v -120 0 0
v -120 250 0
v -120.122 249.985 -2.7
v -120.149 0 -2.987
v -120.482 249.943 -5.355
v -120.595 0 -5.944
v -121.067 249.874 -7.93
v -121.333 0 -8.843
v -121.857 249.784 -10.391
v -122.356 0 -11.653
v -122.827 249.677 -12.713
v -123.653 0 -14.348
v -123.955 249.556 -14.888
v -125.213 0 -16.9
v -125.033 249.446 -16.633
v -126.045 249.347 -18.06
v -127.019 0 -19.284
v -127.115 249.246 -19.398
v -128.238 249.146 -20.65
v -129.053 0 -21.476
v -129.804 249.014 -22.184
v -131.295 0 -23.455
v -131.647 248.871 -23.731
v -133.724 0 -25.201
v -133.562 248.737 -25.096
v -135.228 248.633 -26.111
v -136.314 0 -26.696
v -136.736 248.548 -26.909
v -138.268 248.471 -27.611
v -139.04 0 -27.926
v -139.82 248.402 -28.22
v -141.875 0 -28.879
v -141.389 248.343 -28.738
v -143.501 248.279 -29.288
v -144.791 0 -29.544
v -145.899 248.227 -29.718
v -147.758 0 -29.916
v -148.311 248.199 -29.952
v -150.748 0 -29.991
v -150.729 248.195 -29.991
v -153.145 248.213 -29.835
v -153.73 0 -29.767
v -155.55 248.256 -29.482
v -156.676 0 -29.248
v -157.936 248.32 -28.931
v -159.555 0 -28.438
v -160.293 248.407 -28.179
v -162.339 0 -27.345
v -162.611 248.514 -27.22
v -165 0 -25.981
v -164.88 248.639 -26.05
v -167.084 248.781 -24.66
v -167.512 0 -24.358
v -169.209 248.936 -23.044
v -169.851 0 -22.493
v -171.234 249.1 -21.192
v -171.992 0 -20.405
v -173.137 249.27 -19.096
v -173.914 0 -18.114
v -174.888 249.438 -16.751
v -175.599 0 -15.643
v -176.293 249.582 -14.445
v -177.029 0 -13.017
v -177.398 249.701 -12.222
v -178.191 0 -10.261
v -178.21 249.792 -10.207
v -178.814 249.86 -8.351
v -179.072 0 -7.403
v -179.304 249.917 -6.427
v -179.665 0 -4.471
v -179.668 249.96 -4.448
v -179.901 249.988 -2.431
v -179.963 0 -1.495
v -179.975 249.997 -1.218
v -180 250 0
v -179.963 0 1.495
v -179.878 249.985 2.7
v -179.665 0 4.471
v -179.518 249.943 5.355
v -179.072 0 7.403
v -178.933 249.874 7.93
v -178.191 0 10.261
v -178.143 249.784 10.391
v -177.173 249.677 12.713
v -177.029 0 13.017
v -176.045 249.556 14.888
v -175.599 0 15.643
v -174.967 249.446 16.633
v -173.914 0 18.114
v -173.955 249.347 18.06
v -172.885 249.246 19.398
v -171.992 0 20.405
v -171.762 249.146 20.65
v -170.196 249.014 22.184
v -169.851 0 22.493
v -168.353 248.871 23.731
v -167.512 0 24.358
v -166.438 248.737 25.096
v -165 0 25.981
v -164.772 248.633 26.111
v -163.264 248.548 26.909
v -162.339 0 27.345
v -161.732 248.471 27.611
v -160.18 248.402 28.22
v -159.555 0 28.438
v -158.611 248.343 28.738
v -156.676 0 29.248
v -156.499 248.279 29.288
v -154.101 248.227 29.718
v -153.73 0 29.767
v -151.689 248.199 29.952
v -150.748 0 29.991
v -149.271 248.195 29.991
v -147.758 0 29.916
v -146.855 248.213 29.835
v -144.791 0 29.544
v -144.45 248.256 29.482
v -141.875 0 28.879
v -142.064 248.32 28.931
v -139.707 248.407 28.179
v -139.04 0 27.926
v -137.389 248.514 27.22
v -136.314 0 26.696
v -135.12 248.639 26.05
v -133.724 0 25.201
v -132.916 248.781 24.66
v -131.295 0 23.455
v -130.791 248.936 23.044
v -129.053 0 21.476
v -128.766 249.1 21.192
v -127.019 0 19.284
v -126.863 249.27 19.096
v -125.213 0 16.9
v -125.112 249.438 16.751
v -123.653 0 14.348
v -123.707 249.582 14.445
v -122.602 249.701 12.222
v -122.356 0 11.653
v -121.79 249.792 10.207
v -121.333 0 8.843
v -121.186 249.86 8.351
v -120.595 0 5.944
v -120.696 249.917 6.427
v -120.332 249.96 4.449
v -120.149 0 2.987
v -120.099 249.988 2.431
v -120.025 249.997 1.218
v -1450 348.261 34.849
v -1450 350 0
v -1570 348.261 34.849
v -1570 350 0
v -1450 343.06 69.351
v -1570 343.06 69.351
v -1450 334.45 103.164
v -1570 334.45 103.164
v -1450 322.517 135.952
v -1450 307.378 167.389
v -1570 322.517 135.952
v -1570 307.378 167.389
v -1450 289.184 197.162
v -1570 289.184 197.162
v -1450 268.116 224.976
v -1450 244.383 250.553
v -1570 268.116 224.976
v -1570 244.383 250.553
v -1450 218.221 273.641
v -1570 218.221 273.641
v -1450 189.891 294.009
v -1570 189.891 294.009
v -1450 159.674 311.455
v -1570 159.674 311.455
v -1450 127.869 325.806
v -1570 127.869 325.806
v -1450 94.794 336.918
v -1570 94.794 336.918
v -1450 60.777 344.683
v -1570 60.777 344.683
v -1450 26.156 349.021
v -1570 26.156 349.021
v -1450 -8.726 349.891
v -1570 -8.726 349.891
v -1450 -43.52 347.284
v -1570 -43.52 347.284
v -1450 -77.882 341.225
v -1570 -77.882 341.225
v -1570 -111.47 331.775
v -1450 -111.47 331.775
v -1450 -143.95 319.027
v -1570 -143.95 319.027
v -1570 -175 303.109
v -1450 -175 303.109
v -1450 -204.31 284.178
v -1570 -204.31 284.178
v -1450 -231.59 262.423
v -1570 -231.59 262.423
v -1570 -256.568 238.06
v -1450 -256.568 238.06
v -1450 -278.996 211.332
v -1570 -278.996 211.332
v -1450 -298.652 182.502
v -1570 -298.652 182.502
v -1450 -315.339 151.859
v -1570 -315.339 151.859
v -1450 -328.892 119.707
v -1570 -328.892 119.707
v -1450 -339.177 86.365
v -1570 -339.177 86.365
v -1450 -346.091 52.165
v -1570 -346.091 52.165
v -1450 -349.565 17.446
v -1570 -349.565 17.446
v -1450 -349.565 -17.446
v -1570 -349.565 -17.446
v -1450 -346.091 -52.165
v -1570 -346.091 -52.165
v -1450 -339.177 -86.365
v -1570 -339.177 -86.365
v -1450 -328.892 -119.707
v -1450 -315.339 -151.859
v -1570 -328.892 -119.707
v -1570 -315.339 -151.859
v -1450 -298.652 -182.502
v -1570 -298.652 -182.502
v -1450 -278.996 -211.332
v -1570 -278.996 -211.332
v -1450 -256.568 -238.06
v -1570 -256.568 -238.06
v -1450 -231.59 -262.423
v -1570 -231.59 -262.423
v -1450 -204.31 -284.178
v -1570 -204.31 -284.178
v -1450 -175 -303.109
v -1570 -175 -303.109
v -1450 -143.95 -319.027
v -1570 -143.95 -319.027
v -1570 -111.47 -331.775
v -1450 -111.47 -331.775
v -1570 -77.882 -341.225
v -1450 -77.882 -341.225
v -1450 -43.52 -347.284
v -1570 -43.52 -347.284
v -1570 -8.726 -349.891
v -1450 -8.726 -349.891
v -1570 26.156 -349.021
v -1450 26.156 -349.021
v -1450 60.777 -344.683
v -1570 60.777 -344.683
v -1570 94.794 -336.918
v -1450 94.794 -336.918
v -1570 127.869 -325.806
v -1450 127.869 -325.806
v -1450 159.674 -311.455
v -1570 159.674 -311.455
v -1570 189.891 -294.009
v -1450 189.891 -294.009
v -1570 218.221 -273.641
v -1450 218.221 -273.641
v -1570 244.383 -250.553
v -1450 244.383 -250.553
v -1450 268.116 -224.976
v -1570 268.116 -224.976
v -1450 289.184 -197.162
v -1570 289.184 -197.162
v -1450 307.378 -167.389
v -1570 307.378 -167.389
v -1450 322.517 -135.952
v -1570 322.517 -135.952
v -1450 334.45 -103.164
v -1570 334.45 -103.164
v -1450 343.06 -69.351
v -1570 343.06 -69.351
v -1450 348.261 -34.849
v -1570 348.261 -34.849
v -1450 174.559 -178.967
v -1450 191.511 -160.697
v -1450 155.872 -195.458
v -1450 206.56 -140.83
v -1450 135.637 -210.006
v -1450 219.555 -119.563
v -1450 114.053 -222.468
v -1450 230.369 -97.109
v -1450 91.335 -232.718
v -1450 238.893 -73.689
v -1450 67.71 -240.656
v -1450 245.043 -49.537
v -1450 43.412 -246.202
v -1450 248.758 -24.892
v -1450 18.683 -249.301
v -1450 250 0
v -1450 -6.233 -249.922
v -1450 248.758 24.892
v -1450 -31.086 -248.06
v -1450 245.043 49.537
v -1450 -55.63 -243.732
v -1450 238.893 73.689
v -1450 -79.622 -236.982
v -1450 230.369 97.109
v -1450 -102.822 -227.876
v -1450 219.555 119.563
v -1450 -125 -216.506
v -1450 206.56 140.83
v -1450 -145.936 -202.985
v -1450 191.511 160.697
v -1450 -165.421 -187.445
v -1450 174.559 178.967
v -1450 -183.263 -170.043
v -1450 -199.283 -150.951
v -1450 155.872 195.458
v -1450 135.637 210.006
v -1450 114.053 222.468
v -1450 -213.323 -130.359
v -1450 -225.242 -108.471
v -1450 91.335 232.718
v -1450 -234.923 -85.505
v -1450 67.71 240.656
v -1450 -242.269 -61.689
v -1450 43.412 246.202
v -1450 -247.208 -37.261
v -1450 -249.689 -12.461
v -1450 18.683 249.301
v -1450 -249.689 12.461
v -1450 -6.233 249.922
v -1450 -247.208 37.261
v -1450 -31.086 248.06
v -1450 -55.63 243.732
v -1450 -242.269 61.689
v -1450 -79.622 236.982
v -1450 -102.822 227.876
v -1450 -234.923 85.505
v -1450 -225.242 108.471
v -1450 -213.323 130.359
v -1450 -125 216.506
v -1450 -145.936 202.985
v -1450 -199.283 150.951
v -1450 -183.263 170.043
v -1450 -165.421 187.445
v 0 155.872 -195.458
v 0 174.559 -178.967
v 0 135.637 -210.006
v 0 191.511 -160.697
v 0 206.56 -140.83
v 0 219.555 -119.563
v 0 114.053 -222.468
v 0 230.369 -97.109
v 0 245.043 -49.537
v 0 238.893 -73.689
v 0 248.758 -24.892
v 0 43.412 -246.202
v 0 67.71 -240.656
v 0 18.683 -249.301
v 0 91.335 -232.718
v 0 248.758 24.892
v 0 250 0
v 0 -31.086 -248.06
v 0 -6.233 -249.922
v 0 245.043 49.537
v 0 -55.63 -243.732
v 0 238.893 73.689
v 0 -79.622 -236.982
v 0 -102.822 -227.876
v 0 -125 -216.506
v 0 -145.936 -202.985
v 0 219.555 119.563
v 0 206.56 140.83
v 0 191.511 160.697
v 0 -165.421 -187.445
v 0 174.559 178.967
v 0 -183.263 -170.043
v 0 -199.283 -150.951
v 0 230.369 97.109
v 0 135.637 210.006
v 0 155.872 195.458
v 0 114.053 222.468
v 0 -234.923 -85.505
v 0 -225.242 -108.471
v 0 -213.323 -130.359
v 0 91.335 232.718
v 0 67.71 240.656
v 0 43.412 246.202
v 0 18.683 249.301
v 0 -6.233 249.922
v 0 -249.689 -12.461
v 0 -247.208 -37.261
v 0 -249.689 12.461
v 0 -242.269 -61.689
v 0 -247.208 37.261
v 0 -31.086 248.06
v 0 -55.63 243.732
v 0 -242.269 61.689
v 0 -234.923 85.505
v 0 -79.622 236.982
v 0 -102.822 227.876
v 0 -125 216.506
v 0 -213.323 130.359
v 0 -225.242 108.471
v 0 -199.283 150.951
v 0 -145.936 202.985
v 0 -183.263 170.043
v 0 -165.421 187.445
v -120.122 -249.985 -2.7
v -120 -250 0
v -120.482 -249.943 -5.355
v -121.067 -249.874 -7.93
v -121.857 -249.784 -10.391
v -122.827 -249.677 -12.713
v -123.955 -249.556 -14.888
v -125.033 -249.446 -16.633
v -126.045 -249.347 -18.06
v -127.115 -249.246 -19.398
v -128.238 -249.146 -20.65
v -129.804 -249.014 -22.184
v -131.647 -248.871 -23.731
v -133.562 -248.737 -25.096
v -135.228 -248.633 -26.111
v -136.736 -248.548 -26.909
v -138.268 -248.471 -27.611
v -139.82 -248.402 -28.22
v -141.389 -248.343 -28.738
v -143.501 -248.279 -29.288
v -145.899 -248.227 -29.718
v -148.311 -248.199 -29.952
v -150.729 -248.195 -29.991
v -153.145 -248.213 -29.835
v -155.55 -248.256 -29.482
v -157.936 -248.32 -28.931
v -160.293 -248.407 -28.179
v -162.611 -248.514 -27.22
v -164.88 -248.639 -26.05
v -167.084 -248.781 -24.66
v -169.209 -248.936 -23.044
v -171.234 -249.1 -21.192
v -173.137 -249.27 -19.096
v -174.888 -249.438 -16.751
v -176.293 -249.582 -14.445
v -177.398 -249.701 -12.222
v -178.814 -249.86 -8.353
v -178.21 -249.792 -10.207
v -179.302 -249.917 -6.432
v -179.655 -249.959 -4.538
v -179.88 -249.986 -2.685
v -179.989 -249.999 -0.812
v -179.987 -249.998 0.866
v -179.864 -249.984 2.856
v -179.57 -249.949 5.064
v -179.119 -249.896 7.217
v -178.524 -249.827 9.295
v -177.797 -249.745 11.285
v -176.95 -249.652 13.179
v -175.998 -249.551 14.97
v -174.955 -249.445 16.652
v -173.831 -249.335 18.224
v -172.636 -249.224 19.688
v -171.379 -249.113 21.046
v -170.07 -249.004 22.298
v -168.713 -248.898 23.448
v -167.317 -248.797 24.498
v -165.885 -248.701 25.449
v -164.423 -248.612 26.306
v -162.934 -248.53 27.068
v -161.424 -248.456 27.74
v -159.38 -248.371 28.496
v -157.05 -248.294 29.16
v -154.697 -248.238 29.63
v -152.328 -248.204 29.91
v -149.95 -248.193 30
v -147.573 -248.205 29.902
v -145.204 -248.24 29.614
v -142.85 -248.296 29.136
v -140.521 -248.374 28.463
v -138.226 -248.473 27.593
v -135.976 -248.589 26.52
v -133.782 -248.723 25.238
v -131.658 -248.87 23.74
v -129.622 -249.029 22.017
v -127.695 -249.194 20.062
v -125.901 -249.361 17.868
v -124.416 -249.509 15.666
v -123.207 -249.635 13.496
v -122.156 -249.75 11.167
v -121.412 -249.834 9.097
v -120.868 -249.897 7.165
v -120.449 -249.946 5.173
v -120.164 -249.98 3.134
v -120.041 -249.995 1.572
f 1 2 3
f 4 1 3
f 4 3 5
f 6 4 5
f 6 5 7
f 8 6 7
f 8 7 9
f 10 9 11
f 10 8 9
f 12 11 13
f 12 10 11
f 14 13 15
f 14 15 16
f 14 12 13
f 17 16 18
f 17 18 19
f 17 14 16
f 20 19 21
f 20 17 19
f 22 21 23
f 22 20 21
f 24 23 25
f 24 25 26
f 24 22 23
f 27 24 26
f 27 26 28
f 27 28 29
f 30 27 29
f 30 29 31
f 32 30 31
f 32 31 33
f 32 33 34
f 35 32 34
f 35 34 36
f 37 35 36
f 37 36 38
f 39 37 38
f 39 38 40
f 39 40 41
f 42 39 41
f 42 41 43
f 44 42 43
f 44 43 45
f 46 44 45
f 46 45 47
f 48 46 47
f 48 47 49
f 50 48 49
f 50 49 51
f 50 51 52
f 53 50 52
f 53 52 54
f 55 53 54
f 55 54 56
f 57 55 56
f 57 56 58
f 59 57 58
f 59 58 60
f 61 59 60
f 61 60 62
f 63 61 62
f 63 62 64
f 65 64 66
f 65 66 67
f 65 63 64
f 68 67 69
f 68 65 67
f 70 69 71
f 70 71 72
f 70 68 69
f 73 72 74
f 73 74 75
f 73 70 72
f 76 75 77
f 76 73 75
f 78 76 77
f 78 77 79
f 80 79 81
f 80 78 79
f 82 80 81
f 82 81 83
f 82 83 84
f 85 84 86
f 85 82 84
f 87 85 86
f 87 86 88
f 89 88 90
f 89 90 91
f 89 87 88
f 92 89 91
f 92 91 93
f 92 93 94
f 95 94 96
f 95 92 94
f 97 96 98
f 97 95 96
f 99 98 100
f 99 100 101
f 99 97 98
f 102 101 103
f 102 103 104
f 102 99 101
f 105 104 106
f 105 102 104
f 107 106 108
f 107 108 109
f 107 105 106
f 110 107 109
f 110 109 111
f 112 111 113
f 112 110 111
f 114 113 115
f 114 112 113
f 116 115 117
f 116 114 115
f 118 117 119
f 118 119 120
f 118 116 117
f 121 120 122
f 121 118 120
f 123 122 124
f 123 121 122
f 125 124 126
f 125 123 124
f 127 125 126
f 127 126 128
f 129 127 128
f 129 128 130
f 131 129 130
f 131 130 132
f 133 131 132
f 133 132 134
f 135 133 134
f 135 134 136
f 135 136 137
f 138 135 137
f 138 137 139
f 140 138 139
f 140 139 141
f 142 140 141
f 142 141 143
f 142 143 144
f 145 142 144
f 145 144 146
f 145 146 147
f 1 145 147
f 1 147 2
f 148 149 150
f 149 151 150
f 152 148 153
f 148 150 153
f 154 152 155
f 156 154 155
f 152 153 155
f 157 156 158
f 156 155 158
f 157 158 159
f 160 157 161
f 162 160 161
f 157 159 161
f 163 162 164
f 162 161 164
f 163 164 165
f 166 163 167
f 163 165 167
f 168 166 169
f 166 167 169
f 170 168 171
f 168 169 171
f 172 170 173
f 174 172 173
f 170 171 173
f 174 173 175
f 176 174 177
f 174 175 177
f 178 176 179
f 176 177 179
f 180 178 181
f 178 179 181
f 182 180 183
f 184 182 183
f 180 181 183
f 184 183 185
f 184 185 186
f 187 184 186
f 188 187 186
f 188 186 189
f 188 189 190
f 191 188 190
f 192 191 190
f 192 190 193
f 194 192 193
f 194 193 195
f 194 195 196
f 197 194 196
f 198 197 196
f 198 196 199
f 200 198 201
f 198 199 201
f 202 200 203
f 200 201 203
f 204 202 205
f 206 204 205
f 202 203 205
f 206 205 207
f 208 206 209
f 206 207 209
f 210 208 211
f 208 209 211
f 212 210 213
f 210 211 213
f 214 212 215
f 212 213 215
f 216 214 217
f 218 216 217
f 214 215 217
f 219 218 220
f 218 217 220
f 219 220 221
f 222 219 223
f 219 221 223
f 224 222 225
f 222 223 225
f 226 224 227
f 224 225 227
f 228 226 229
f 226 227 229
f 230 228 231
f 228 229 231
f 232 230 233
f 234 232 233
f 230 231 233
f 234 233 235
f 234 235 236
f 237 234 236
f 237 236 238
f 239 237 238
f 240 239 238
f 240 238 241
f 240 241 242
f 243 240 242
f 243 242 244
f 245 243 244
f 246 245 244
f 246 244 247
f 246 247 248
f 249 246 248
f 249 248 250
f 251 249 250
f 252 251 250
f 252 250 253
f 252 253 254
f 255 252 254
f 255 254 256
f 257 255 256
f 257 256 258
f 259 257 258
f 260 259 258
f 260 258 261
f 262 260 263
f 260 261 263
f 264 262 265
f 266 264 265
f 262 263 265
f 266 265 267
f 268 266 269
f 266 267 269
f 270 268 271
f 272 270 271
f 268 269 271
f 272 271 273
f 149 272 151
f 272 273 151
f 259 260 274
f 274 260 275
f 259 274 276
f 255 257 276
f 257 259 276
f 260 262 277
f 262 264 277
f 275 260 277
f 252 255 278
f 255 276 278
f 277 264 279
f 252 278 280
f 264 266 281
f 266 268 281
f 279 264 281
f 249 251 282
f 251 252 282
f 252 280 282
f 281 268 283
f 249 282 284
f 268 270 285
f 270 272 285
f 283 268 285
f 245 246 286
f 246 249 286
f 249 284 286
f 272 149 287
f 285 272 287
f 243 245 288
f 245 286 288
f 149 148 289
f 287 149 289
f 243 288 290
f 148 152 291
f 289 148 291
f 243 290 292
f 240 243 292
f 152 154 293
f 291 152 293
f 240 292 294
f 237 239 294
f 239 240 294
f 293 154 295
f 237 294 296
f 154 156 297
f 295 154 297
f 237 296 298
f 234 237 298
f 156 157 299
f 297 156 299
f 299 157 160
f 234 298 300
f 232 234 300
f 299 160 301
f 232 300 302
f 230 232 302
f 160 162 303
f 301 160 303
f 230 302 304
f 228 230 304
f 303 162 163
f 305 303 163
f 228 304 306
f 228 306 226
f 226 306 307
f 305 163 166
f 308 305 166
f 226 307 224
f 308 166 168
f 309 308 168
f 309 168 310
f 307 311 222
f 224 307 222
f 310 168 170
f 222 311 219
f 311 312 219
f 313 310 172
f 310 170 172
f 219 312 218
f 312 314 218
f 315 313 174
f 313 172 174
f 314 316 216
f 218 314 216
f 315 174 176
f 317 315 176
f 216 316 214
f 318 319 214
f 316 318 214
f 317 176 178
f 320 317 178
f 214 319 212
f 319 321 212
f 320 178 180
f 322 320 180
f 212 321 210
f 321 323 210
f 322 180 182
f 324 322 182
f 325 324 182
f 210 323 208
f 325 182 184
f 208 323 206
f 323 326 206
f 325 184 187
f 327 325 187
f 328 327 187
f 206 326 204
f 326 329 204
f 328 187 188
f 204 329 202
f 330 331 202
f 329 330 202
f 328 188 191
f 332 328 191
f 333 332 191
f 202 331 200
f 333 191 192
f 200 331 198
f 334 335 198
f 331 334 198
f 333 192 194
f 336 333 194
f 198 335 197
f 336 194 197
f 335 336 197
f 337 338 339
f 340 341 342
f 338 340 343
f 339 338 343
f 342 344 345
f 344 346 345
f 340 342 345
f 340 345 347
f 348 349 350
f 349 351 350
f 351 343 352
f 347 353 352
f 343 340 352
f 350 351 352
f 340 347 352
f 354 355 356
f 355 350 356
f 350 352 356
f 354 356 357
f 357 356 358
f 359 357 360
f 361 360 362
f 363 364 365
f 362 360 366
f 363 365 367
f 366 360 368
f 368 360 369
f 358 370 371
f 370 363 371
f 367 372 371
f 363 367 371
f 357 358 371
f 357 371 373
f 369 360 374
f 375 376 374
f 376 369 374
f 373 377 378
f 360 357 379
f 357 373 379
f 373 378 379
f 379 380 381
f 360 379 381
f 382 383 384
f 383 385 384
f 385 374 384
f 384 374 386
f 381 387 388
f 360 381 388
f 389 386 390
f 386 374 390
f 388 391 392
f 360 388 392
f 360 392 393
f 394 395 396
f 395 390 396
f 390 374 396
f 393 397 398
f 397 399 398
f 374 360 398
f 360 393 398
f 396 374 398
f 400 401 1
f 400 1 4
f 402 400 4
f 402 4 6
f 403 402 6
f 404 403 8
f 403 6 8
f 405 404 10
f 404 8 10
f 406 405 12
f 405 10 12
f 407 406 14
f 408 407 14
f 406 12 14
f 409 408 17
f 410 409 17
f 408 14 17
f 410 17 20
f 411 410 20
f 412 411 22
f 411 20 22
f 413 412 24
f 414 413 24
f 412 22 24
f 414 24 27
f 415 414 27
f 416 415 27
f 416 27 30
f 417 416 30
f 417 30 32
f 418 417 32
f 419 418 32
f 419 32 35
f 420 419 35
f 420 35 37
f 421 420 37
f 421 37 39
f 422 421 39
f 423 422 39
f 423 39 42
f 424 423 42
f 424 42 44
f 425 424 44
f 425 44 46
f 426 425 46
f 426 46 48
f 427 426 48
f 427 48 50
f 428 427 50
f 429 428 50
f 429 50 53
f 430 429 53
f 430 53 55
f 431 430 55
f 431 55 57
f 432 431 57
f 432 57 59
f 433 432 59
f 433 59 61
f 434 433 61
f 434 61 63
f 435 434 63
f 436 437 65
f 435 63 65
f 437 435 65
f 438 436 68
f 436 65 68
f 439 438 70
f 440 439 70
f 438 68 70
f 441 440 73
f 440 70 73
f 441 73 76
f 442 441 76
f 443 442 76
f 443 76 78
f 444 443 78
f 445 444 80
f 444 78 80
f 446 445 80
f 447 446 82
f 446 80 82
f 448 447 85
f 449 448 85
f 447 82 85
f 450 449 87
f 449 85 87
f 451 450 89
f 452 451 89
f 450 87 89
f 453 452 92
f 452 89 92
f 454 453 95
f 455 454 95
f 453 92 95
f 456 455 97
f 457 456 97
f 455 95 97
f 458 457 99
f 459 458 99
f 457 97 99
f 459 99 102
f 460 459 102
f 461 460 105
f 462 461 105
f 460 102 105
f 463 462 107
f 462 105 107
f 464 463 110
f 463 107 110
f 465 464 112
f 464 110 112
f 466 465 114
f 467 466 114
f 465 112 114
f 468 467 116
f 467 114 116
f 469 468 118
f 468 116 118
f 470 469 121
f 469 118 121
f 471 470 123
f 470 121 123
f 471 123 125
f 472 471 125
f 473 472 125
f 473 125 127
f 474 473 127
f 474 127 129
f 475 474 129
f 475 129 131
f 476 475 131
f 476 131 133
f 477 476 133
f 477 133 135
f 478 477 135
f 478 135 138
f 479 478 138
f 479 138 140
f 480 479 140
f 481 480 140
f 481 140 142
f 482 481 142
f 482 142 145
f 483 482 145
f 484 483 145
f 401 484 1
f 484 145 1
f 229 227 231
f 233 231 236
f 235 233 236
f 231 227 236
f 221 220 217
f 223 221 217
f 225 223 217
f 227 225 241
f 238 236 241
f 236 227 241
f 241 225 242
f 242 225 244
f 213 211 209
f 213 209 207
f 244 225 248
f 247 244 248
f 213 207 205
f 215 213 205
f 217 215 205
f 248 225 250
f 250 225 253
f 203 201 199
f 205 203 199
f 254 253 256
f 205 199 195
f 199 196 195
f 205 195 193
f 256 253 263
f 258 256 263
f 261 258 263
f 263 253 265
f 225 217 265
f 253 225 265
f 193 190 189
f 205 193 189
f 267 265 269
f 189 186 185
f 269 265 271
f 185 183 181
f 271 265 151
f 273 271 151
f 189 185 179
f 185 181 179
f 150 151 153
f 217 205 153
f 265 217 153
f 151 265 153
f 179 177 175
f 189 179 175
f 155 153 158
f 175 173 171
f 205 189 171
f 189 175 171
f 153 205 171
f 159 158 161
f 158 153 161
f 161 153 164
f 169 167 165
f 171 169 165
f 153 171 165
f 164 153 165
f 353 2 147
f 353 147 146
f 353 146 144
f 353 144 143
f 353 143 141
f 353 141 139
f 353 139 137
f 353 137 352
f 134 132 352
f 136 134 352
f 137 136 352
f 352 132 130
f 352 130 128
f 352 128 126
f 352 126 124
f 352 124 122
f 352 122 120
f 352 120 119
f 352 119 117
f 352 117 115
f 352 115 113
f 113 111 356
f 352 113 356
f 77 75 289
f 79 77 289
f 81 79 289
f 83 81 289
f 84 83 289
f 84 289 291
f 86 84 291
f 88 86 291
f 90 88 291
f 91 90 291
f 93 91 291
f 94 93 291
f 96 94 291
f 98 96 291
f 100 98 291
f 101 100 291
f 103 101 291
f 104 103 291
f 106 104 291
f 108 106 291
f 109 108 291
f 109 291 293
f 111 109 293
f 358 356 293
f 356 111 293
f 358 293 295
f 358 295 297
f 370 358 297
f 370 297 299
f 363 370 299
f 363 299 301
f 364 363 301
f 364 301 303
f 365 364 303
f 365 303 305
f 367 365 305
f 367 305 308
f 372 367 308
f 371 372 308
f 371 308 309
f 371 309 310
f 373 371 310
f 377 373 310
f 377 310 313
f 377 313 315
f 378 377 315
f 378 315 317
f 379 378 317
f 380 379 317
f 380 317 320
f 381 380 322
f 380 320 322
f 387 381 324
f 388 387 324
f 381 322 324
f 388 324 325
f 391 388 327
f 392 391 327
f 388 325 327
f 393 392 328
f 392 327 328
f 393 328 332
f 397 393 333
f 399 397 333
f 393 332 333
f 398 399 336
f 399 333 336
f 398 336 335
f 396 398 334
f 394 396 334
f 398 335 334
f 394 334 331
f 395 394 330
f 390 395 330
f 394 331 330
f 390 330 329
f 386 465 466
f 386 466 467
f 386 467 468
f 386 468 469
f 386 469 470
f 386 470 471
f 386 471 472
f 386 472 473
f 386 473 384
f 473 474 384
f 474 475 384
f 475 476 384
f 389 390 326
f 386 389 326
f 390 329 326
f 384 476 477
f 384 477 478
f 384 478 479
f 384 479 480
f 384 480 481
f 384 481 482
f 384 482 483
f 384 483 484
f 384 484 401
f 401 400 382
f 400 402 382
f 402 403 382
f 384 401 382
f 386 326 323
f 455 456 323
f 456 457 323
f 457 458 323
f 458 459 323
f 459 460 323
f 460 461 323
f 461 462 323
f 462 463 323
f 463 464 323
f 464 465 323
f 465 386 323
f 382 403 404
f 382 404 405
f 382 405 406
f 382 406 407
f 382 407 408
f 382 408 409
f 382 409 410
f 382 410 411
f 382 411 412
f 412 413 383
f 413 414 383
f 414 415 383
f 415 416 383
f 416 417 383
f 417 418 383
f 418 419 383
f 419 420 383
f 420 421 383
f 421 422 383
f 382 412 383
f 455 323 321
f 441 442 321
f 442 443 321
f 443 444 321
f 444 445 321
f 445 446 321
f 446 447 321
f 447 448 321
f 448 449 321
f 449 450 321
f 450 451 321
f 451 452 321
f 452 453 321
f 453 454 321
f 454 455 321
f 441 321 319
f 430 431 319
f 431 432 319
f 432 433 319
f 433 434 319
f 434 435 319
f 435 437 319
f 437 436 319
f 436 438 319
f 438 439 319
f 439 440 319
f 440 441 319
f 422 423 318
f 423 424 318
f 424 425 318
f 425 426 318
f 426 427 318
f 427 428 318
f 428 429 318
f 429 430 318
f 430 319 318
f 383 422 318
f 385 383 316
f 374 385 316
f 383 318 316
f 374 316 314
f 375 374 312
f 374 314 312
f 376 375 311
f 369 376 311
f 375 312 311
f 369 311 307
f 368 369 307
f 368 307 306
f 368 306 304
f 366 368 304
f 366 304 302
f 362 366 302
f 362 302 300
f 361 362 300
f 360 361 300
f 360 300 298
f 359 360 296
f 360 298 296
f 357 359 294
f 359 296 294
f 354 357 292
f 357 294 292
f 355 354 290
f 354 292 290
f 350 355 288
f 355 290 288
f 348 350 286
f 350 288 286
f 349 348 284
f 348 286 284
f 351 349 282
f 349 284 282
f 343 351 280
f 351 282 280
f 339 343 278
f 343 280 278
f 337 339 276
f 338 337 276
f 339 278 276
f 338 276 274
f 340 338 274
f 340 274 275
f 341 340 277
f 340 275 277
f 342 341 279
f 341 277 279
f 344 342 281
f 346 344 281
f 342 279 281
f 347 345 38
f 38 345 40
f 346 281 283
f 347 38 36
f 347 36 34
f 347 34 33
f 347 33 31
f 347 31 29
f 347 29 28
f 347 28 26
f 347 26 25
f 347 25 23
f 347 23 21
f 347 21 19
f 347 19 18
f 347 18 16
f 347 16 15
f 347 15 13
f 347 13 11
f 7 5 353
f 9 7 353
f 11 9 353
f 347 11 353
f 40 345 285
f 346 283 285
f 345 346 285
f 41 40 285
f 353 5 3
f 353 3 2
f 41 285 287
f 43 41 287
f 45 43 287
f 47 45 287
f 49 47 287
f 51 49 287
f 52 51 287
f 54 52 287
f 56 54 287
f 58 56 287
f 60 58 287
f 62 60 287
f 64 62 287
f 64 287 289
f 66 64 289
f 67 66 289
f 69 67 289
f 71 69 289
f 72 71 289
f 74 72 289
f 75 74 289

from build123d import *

# Parameters (mm, degrees)
SKETCH3_R               = 30
CUT_EXTRUDE1_DEPTH      = 351
CUT_EXTRUDE1_DEPTH_BACK = 351


with BuildPart() as part:
    # Sketch2 → Revolve1 (revolve)
    with BuildSketch(Plane.XY):
        Polygon((0, 0), (0, 250), (-1450, 250), (-1450, 350), (-1570, 350), (-1570, 0), align=None)
    revolve(axis=Axis((-1570, 0, 0), (1, 0, 0)))

    # Sketch3 → Cut-Extrude1 (cut, two sides)
    with BuildSketch(Plane(origin=(0, 0, 0), x_dir=(1, 0, 0), z_dir=(0, 1, 0))) as cut_extrude1_sk:
        with Locations((-150, 0)):
            Circle(SKETCH3_R)
    extrude(amount=CUT_EXTRUDE1_DEPTH, mode=Mode.SUBTRACT)
    extrude(cut_extrude1_sk.sketch, amount=-CUT_EXTRUDE1_DEPTH_BACK, mode=Mode.SUBTRACT)


solid = part.part
